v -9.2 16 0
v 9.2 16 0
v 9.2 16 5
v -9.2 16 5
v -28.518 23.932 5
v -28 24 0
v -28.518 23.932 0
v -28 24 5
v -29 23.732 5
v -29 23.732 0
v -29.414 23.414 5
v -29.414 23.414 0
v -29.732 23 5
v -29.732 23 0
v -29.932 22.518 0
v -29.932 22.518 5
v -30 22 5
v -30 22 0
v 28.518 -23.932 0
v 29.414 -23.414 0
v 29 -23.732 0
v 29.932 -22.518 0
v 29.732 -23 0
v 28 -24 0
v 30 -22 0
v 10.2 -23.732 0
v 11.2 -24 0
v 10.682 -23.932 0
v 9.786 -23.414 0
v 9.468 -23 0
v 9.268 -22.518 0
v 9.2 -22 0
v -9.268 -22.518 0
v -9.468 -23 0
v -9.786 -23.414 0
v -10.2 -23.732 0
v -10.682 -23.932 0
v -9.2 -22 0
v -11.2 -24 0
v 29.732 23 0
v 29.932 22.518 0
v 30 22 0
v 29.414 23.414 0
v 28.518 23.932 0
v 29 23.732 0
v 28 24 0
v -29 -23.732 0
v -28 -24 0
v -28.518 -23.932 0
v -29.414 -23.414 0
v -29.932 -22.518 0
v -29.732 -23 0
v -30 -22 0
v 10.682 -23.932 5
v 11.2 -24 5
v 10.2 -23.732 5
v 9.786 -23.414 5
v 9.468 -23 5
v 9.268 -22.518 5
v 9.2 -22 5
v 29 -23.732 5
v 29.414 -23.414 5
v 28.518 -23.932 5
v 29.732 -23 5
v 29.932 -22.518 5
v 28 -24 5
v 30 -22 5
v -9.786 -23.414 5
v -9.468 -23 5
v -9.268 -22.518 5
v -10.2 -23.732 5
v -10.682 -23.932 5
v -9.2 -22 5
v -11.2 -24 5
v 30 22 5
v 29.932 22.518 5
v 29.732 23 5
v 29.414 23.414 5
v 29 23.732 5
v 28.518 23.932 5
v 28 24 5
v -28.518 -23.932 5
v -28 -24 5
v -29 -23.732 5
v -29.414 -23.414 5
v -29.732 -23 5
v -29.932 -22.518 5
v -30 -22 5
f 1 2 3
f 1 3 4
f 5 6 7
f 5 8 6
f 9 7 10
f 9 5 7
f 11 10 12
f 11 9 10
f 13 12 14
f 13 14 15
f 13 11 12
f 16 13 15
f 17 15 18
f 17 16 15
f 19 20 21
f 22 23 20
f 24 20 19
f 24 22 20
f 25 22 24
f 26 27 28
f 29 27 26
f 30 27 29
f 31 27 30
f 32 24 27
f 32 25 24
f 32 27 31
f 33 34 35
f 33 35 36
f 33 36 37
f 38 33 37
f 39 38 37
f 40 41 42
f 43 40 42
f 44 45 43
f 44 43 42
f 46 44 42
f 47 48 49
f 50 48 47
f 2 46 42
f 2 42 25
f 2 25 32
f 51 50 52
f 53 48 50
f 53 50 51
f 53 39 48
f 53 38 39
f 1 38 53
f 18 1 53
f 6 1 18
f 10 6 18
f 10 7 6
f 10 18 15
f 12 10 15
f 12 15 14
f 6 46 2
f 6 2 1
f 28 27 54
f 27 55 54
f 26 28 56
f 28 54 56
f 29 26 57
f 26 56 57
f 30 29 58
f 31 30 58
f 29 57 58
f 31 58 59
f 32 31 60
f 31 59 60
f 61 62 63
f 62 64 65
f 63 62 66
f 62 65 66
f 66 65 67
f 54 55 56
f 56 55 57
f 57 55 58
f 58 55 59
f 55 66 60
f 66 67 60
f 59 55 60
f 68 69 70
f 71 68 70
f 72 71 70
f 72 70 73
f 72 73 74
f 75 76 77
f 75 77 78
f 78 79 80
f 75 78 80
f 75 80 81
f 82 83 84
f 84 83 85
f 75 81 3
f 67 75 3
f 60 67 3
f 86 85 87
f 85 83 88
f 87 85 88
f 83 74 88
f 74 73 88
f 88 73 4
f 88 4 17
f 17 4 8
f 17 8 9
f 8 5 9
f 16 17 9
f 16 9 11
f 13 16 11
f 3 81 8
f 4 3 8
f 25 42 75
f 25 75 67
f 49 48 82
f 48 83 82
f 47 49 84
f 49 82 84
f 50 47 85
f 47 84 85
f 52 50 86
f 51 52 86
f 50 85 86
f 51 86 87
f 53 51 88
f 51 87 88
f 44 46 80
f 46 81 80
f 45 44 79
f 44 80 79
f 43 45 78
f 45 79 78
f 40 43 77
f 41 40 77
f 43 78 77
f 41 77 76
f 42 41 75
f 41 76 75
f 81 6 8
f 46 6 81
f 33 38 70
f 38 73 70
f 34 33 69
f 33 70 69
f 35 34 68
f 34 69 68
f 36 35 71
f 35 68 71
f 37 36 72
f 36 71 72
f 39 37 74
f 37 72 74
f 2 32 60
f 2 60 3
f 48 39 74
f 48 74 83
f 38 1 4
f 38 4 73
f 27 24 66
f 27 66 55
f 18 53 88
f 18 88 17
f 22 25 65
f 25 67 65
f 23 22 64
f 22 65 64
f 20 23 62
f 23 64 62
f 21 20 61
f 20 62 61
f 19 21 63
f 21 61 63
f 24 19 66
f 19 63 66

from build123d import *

# Parameters (mm, degrees)
EXTRUDE_1_DEPTH = 5
FILLET_1_R      = 2


with BuildPart() as part:
    # 草图1 → 凸台-拉伸1 (new body)
    with BuildSketch(Plane.XY):
        Polygon((-30, 24), (30, 24), (30, -24), (9.2, -24), (9.2, 16), (-9.2, 16), (-9.2, -24), (-30, -24), align=None)
    extrude(amount=EXTRUDE_1_DEPTH)

    # 圆角1
    fillet_1_edges = [part.edges().sort_by_distance(p)[0] for p in [
        (9.2, -24, 2.5),
        (-9.2, -24, 2.5),
        (-30, -24, 2.5),
        (-30, 24, 2.5),
        (30, 24, 2.5),
        (30, -24, 2.5),
    ]]
    fillet(fillet_1_edges, radius=FILLET_1_R)


solid = part.part
